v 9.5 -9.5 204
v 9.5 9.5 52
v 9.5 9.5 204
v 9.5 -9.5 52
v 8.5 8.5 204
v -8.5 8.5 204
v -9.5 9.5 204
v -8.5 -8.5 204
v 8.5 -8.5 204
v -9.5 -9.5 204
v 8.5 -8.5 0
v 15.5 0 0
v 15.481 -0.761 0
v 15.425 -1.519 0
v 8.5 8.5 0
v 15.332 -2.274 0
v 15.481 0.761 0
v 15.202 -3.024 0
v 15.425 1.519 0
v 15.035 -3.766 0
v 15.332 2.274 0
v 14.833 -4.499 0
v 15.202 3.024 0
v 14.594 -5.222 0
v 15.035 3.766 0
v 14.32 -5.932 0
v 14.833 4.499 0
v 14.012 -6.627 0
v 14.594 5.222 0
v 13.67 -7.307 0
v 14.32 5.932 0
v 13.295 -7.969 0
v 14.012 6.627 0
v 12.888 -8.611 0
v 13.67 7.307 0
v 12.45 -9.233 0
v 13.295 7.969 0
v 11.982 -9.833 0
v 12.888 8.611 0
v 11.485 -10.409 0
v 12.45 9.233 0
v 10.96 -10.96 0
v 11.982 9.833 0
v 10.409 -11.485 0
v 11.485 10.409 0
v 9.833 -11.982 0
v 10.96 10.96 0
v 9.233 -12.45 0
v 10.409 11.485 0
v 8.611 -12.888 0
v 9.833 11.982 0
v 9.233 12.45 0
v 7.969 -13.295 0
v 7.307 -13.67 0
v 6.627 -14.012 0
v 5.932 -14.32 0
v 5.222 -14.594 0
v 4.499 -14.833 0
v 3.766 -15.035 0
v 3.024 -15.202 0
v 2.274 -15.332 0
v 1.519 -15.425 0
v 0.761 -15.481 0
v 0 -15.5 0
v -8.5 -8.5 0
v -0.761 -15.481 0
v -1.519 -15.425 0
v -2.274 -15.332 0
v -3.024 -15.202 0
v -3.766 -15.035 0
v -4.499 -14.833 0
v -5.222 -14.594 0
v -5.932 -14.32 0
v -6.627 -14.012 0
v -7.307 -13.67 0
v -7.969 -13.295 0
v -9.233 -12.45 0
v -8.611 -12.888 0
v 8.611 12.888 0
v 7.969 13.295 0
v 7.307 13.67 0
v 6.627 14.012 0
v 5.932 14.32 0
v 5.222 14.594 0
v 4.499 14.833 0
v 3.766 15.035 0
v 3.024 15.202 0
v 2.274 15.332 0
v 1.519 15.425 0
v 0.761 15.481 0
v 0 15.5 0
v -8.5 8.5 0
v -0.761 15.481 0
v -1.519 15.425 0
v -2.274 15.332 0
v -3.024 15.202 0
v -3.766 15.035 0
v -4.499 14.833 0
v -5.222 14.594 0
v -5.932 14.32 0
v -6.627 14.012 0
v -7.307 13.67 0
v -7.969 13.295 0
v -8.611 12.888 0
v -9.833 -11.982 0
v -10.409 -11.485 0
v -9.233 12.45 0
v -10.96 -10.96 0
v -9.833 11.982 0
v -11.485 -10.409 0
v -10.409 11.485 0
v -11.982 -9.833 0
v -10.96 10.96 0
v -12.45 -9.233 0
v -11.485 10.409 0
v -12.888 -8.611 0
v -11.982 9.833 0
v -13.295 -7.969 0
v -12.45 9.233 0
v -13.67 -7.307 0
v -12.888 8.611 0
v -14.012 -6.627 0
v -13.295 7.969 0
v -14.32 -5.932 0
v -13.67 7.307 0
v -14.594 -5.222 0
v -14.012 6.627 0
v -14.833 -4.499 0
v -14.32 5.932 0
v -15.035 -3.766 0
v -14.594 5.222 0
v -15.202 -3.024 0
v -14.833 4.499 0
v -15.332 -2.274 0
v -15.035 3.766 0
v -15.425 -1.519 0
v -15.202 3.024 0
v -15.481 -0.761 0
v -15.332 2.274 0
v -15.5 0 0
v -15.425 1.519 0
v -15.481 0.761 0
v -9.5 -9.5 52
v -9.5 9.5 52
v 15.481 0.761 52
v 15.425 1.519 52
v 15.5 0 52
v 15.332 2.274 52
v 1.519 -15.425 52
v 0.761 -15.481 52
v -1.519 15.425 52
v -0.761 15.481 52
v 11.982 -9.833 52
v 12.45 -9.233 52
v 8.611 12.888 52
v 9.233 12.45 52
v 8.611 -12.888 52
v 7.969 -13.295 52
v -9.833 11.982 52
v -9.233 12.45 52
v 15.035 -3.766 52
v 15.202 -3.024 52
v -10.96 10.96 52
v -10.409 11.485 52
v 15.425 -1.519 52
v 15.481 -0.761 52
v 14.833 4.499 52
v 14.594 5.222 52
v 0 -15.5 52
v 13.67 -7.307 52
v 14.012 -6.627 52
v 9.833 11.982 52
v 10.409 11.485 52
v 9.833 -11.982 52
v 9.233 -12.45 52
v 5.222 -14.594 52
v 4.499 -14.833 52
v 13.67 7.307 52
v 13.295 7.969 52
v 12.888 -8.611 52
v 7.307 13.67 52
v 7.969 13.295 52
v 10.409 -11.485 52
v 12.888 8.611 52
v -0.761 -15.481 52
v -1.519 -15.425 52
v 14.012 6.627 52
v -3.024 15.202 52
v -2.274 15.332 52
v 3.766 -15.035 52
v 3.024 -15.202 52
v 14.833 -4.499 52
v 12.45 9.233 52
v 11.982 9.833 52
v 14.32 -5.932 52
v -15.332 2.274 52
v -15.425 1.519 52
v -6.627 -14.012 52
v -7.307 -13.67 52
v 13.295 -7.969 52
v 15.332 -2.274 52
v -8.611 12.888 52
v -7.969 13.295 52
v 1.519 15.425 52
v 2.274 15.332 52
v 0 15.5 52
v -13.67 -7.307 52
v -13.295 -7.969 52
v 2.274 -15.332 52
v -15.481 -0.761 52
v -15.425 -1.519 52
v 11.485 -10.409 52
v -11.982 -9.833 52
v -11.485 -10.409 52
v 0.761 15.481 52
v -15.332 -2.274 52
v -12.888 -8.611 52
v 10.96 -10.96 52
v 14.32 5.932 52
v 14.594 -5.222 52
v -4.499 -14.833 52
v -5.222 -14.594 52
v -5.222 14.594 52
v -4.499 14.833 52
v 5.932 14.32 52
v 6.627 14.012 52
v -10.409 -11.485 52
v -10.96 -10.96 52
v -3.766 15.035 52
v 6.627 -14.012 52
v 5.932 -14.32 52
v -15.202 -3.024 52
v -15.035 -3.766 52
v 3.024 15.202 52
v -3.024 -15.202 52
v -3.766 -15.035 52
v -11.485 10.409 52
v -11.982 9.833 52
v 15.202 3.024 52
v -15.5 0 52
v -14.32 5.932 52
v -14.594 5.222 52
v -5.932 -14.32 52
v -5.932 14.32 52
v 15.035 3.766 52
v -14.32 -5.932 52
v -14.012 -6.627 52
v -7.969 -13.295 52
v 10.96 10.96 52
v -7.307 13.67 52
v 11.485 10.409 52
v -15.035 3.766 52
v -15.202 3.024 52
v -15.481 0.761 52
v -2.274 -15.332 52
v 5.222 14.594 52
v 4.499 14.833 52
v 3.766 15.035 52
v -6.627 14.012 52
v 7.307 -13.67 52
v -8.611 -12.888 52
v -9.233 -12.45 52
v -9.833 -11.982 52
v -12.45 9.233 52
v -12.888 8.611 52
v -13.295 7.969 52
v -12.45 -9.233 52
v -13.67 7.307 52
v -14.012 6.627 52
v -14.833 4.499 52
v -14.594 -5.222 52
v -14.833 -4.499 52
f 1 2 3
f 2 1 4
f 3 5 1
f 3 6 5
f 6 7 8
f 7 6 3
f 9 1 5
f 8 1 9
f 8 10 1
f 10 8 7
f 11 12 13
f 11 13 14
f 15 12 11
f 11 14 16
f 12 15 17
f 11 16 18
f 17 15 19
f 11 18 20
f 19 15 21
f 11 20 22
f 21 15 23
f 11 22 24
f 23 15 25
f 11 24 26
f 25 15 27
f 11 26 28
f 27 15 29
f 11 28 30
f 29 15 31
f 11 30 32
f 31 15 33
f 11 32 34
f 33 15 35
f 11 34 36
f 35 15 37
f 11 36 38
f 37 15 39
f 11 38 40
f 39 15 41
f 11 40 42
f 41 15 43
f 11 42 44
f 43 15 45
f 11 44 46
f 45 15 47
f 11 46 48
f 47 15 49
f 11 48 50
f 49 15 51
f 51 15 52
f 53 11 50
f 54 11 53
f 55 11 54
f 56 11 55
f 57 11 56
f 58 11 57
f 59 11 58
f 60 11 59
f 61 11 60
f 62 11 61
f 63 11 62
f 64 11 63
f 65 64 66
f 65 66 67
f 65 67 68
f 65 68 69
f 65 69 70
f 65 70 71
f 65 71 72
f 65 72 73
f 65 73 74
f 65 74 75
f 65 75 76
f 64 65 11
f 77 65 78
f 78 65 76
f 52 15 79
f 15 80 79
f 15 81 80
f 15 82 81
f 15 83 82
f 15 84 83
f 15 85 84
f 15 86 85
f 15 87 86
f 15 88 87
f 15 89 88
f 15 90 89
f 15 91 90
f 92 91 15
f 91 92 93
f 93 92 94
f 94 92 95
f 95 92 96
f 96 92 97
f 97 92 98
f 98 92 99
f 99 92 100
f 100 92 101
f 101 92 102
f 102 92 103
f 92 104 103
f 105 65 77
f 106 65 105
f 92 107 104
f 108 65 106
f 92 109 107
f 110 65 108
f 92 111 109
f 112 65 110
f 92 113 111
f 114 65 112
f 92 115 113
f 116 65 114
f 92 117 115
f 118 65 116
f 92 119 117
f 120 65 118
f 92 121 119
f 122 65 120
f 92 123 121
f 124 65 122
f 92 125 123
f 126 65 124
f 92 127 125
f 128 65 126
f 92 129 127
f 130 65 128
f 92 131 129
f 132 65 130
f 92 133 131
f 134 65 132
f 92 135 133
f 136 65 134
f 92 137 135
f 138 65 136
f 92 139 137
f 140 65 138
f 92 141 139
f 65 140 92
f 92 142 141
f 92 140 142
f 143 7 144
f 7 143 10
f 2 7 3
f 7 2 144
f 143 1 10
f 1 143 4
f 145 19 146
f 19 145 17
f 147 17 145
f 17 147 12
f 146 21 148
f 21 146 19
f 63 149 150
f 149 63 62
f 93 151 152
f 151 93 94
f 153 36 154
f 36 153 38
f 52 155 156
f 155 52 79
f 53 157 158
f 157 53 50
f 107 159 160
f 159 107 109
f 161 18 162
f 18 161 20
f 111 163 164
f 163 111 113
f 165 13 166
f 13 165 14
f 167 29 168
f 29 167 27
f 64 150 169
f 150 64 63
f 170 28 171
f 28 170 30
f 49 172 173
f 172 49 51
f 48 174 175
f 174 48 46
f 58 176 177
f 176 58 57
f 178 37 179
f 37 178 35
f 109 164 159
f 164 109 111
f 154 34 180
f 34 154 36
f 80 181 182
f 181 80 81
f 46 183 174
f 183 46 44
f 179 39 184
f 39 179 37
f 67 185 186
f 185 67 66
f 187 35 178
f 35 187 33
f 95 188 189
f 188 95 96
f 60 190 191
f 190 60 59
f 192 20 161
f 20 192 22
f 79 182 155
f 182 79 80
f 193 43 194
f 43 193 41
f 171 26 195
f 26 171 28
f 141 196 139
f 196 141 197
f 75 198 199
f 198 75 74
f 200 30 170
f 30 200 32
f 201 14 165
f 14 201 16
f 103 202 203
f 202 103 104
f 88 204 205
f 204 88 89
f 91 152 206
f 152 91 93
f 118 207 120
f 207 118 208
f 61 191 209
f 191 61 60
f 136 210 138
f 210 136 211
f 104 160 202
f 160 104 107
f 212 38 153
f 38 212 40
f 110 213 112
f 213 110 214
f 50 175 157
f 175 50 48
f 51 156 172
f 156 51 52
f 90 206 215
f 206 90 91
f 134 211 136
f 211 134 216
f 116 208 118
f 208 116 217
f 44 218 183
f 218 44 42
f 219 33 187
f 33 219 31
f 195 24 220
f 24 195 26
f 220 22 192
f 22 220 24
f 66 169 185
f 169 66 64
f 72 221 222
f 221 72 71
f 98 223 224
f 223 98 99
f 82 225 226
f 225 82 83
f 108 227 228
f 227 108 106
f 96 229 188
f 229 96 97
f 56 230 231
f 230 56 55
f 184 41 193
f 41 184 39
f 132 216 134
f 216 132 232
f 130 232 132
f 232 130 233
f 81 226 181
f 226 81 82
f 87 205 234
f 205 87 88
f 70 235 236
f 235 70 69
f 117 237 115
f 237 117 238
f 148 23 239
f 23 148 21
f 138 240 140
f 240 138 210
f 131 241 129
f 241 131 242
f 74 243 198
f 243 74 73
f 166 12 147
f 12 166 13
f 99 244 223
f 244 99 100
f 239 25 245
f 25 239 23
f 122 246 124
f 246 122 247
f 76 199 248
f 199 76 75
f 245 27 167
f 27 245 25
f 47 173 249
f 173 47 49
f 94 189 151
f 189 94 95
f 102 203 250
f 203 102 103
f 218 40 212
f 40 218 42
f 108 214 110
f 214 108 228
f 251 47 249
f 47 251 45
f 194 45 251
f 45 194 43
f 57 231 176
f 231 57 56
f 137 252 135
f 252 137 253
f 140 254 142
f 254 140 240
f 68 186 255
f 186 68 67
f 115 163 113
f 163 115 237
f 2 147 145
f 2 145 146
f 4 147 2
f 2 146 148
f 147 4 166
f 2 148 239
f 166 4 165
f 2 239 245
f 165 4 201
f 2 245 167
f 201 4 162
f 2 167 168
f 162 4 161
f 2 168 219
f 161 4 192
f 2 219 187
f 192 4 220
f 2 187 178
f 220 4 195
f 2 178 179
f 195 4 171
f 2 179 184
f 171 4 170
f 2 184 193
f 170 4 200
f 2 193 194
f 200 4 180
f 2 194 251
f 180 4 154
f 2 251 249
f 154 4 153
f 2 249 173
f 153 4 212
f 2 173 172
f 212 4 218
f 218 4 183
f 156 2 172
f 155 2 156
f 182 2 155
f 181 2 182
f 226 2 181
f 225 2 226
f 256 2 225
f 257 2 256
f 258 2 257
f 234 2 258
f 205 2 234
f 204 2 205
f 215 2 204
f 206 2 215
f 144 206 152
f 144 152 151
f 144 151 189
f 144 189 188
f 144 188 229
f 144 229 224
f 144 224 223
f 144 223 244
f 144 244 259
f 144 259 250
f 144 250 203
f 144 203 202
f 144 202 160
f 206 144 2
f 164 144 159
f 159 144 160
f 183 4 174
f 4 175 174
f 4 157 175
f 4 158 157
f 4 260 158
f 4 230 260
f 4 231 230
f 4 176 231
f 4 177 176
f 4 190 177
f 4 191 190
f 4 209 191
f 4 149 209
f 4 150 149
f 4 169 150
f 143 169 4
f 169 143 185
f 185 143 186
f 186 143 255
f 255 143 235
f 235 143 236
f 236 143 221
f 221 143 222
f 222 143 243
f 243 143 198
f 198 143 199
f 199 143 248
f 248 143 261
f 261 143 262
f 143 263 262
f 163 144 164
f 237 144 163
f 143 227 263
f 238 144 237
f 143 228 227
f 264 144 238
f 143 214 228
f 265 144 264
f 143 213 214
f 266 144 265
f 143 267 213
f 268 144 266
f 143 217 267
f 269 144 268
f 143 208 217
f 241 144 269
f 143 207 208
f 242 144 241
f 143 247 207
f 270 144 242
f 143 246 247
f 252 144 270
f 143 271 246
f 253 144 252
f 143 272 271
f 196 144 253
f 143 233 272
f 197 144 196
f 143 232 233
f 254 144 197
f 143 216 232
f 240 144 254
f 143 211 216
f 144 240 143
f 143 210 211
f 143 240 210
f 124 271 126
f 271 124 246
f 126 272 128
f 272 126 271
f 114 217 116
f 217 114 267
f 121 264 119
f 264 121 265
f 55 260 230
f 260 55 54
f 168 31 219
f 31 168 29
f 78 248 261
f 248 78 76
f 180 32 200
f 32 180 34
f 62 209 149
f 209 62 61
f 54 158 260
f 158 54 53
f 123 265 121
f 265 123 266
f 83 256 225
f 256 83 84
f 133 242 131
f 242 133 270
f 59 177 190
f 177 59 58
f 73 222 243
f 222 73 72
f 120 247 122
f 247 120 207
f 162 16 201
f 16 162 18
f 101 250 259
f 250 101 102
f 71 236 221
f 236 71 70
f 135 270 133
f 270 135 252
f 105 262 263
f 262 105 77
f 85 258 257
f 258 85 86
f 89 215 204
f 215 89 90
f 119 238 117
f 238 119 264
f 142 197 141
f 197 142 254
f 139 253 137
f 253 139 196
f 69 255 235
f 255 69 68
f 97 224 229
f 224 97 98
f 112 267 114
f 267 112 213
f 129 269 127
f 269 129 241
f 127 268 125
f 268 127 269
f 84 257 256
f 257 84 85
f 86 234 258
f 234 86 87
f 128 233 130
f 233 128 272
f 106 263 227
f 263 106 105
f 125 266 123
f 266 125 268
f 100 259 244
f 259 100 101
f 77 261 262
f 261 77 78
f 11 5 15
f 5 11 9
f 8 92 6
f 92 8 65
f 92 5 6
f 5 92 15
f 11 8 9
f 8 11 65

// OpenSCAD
cube =17;
wall = 2;
length =cube*12;
d = 31;


difference(){
union(){
translate([0,0,length/2])
cube([cube+wall,cube+wall,length],center =true);
cylinder(52,d=d,$fn=128);
}
cube([cube,cube,length*4],center=true);
}
